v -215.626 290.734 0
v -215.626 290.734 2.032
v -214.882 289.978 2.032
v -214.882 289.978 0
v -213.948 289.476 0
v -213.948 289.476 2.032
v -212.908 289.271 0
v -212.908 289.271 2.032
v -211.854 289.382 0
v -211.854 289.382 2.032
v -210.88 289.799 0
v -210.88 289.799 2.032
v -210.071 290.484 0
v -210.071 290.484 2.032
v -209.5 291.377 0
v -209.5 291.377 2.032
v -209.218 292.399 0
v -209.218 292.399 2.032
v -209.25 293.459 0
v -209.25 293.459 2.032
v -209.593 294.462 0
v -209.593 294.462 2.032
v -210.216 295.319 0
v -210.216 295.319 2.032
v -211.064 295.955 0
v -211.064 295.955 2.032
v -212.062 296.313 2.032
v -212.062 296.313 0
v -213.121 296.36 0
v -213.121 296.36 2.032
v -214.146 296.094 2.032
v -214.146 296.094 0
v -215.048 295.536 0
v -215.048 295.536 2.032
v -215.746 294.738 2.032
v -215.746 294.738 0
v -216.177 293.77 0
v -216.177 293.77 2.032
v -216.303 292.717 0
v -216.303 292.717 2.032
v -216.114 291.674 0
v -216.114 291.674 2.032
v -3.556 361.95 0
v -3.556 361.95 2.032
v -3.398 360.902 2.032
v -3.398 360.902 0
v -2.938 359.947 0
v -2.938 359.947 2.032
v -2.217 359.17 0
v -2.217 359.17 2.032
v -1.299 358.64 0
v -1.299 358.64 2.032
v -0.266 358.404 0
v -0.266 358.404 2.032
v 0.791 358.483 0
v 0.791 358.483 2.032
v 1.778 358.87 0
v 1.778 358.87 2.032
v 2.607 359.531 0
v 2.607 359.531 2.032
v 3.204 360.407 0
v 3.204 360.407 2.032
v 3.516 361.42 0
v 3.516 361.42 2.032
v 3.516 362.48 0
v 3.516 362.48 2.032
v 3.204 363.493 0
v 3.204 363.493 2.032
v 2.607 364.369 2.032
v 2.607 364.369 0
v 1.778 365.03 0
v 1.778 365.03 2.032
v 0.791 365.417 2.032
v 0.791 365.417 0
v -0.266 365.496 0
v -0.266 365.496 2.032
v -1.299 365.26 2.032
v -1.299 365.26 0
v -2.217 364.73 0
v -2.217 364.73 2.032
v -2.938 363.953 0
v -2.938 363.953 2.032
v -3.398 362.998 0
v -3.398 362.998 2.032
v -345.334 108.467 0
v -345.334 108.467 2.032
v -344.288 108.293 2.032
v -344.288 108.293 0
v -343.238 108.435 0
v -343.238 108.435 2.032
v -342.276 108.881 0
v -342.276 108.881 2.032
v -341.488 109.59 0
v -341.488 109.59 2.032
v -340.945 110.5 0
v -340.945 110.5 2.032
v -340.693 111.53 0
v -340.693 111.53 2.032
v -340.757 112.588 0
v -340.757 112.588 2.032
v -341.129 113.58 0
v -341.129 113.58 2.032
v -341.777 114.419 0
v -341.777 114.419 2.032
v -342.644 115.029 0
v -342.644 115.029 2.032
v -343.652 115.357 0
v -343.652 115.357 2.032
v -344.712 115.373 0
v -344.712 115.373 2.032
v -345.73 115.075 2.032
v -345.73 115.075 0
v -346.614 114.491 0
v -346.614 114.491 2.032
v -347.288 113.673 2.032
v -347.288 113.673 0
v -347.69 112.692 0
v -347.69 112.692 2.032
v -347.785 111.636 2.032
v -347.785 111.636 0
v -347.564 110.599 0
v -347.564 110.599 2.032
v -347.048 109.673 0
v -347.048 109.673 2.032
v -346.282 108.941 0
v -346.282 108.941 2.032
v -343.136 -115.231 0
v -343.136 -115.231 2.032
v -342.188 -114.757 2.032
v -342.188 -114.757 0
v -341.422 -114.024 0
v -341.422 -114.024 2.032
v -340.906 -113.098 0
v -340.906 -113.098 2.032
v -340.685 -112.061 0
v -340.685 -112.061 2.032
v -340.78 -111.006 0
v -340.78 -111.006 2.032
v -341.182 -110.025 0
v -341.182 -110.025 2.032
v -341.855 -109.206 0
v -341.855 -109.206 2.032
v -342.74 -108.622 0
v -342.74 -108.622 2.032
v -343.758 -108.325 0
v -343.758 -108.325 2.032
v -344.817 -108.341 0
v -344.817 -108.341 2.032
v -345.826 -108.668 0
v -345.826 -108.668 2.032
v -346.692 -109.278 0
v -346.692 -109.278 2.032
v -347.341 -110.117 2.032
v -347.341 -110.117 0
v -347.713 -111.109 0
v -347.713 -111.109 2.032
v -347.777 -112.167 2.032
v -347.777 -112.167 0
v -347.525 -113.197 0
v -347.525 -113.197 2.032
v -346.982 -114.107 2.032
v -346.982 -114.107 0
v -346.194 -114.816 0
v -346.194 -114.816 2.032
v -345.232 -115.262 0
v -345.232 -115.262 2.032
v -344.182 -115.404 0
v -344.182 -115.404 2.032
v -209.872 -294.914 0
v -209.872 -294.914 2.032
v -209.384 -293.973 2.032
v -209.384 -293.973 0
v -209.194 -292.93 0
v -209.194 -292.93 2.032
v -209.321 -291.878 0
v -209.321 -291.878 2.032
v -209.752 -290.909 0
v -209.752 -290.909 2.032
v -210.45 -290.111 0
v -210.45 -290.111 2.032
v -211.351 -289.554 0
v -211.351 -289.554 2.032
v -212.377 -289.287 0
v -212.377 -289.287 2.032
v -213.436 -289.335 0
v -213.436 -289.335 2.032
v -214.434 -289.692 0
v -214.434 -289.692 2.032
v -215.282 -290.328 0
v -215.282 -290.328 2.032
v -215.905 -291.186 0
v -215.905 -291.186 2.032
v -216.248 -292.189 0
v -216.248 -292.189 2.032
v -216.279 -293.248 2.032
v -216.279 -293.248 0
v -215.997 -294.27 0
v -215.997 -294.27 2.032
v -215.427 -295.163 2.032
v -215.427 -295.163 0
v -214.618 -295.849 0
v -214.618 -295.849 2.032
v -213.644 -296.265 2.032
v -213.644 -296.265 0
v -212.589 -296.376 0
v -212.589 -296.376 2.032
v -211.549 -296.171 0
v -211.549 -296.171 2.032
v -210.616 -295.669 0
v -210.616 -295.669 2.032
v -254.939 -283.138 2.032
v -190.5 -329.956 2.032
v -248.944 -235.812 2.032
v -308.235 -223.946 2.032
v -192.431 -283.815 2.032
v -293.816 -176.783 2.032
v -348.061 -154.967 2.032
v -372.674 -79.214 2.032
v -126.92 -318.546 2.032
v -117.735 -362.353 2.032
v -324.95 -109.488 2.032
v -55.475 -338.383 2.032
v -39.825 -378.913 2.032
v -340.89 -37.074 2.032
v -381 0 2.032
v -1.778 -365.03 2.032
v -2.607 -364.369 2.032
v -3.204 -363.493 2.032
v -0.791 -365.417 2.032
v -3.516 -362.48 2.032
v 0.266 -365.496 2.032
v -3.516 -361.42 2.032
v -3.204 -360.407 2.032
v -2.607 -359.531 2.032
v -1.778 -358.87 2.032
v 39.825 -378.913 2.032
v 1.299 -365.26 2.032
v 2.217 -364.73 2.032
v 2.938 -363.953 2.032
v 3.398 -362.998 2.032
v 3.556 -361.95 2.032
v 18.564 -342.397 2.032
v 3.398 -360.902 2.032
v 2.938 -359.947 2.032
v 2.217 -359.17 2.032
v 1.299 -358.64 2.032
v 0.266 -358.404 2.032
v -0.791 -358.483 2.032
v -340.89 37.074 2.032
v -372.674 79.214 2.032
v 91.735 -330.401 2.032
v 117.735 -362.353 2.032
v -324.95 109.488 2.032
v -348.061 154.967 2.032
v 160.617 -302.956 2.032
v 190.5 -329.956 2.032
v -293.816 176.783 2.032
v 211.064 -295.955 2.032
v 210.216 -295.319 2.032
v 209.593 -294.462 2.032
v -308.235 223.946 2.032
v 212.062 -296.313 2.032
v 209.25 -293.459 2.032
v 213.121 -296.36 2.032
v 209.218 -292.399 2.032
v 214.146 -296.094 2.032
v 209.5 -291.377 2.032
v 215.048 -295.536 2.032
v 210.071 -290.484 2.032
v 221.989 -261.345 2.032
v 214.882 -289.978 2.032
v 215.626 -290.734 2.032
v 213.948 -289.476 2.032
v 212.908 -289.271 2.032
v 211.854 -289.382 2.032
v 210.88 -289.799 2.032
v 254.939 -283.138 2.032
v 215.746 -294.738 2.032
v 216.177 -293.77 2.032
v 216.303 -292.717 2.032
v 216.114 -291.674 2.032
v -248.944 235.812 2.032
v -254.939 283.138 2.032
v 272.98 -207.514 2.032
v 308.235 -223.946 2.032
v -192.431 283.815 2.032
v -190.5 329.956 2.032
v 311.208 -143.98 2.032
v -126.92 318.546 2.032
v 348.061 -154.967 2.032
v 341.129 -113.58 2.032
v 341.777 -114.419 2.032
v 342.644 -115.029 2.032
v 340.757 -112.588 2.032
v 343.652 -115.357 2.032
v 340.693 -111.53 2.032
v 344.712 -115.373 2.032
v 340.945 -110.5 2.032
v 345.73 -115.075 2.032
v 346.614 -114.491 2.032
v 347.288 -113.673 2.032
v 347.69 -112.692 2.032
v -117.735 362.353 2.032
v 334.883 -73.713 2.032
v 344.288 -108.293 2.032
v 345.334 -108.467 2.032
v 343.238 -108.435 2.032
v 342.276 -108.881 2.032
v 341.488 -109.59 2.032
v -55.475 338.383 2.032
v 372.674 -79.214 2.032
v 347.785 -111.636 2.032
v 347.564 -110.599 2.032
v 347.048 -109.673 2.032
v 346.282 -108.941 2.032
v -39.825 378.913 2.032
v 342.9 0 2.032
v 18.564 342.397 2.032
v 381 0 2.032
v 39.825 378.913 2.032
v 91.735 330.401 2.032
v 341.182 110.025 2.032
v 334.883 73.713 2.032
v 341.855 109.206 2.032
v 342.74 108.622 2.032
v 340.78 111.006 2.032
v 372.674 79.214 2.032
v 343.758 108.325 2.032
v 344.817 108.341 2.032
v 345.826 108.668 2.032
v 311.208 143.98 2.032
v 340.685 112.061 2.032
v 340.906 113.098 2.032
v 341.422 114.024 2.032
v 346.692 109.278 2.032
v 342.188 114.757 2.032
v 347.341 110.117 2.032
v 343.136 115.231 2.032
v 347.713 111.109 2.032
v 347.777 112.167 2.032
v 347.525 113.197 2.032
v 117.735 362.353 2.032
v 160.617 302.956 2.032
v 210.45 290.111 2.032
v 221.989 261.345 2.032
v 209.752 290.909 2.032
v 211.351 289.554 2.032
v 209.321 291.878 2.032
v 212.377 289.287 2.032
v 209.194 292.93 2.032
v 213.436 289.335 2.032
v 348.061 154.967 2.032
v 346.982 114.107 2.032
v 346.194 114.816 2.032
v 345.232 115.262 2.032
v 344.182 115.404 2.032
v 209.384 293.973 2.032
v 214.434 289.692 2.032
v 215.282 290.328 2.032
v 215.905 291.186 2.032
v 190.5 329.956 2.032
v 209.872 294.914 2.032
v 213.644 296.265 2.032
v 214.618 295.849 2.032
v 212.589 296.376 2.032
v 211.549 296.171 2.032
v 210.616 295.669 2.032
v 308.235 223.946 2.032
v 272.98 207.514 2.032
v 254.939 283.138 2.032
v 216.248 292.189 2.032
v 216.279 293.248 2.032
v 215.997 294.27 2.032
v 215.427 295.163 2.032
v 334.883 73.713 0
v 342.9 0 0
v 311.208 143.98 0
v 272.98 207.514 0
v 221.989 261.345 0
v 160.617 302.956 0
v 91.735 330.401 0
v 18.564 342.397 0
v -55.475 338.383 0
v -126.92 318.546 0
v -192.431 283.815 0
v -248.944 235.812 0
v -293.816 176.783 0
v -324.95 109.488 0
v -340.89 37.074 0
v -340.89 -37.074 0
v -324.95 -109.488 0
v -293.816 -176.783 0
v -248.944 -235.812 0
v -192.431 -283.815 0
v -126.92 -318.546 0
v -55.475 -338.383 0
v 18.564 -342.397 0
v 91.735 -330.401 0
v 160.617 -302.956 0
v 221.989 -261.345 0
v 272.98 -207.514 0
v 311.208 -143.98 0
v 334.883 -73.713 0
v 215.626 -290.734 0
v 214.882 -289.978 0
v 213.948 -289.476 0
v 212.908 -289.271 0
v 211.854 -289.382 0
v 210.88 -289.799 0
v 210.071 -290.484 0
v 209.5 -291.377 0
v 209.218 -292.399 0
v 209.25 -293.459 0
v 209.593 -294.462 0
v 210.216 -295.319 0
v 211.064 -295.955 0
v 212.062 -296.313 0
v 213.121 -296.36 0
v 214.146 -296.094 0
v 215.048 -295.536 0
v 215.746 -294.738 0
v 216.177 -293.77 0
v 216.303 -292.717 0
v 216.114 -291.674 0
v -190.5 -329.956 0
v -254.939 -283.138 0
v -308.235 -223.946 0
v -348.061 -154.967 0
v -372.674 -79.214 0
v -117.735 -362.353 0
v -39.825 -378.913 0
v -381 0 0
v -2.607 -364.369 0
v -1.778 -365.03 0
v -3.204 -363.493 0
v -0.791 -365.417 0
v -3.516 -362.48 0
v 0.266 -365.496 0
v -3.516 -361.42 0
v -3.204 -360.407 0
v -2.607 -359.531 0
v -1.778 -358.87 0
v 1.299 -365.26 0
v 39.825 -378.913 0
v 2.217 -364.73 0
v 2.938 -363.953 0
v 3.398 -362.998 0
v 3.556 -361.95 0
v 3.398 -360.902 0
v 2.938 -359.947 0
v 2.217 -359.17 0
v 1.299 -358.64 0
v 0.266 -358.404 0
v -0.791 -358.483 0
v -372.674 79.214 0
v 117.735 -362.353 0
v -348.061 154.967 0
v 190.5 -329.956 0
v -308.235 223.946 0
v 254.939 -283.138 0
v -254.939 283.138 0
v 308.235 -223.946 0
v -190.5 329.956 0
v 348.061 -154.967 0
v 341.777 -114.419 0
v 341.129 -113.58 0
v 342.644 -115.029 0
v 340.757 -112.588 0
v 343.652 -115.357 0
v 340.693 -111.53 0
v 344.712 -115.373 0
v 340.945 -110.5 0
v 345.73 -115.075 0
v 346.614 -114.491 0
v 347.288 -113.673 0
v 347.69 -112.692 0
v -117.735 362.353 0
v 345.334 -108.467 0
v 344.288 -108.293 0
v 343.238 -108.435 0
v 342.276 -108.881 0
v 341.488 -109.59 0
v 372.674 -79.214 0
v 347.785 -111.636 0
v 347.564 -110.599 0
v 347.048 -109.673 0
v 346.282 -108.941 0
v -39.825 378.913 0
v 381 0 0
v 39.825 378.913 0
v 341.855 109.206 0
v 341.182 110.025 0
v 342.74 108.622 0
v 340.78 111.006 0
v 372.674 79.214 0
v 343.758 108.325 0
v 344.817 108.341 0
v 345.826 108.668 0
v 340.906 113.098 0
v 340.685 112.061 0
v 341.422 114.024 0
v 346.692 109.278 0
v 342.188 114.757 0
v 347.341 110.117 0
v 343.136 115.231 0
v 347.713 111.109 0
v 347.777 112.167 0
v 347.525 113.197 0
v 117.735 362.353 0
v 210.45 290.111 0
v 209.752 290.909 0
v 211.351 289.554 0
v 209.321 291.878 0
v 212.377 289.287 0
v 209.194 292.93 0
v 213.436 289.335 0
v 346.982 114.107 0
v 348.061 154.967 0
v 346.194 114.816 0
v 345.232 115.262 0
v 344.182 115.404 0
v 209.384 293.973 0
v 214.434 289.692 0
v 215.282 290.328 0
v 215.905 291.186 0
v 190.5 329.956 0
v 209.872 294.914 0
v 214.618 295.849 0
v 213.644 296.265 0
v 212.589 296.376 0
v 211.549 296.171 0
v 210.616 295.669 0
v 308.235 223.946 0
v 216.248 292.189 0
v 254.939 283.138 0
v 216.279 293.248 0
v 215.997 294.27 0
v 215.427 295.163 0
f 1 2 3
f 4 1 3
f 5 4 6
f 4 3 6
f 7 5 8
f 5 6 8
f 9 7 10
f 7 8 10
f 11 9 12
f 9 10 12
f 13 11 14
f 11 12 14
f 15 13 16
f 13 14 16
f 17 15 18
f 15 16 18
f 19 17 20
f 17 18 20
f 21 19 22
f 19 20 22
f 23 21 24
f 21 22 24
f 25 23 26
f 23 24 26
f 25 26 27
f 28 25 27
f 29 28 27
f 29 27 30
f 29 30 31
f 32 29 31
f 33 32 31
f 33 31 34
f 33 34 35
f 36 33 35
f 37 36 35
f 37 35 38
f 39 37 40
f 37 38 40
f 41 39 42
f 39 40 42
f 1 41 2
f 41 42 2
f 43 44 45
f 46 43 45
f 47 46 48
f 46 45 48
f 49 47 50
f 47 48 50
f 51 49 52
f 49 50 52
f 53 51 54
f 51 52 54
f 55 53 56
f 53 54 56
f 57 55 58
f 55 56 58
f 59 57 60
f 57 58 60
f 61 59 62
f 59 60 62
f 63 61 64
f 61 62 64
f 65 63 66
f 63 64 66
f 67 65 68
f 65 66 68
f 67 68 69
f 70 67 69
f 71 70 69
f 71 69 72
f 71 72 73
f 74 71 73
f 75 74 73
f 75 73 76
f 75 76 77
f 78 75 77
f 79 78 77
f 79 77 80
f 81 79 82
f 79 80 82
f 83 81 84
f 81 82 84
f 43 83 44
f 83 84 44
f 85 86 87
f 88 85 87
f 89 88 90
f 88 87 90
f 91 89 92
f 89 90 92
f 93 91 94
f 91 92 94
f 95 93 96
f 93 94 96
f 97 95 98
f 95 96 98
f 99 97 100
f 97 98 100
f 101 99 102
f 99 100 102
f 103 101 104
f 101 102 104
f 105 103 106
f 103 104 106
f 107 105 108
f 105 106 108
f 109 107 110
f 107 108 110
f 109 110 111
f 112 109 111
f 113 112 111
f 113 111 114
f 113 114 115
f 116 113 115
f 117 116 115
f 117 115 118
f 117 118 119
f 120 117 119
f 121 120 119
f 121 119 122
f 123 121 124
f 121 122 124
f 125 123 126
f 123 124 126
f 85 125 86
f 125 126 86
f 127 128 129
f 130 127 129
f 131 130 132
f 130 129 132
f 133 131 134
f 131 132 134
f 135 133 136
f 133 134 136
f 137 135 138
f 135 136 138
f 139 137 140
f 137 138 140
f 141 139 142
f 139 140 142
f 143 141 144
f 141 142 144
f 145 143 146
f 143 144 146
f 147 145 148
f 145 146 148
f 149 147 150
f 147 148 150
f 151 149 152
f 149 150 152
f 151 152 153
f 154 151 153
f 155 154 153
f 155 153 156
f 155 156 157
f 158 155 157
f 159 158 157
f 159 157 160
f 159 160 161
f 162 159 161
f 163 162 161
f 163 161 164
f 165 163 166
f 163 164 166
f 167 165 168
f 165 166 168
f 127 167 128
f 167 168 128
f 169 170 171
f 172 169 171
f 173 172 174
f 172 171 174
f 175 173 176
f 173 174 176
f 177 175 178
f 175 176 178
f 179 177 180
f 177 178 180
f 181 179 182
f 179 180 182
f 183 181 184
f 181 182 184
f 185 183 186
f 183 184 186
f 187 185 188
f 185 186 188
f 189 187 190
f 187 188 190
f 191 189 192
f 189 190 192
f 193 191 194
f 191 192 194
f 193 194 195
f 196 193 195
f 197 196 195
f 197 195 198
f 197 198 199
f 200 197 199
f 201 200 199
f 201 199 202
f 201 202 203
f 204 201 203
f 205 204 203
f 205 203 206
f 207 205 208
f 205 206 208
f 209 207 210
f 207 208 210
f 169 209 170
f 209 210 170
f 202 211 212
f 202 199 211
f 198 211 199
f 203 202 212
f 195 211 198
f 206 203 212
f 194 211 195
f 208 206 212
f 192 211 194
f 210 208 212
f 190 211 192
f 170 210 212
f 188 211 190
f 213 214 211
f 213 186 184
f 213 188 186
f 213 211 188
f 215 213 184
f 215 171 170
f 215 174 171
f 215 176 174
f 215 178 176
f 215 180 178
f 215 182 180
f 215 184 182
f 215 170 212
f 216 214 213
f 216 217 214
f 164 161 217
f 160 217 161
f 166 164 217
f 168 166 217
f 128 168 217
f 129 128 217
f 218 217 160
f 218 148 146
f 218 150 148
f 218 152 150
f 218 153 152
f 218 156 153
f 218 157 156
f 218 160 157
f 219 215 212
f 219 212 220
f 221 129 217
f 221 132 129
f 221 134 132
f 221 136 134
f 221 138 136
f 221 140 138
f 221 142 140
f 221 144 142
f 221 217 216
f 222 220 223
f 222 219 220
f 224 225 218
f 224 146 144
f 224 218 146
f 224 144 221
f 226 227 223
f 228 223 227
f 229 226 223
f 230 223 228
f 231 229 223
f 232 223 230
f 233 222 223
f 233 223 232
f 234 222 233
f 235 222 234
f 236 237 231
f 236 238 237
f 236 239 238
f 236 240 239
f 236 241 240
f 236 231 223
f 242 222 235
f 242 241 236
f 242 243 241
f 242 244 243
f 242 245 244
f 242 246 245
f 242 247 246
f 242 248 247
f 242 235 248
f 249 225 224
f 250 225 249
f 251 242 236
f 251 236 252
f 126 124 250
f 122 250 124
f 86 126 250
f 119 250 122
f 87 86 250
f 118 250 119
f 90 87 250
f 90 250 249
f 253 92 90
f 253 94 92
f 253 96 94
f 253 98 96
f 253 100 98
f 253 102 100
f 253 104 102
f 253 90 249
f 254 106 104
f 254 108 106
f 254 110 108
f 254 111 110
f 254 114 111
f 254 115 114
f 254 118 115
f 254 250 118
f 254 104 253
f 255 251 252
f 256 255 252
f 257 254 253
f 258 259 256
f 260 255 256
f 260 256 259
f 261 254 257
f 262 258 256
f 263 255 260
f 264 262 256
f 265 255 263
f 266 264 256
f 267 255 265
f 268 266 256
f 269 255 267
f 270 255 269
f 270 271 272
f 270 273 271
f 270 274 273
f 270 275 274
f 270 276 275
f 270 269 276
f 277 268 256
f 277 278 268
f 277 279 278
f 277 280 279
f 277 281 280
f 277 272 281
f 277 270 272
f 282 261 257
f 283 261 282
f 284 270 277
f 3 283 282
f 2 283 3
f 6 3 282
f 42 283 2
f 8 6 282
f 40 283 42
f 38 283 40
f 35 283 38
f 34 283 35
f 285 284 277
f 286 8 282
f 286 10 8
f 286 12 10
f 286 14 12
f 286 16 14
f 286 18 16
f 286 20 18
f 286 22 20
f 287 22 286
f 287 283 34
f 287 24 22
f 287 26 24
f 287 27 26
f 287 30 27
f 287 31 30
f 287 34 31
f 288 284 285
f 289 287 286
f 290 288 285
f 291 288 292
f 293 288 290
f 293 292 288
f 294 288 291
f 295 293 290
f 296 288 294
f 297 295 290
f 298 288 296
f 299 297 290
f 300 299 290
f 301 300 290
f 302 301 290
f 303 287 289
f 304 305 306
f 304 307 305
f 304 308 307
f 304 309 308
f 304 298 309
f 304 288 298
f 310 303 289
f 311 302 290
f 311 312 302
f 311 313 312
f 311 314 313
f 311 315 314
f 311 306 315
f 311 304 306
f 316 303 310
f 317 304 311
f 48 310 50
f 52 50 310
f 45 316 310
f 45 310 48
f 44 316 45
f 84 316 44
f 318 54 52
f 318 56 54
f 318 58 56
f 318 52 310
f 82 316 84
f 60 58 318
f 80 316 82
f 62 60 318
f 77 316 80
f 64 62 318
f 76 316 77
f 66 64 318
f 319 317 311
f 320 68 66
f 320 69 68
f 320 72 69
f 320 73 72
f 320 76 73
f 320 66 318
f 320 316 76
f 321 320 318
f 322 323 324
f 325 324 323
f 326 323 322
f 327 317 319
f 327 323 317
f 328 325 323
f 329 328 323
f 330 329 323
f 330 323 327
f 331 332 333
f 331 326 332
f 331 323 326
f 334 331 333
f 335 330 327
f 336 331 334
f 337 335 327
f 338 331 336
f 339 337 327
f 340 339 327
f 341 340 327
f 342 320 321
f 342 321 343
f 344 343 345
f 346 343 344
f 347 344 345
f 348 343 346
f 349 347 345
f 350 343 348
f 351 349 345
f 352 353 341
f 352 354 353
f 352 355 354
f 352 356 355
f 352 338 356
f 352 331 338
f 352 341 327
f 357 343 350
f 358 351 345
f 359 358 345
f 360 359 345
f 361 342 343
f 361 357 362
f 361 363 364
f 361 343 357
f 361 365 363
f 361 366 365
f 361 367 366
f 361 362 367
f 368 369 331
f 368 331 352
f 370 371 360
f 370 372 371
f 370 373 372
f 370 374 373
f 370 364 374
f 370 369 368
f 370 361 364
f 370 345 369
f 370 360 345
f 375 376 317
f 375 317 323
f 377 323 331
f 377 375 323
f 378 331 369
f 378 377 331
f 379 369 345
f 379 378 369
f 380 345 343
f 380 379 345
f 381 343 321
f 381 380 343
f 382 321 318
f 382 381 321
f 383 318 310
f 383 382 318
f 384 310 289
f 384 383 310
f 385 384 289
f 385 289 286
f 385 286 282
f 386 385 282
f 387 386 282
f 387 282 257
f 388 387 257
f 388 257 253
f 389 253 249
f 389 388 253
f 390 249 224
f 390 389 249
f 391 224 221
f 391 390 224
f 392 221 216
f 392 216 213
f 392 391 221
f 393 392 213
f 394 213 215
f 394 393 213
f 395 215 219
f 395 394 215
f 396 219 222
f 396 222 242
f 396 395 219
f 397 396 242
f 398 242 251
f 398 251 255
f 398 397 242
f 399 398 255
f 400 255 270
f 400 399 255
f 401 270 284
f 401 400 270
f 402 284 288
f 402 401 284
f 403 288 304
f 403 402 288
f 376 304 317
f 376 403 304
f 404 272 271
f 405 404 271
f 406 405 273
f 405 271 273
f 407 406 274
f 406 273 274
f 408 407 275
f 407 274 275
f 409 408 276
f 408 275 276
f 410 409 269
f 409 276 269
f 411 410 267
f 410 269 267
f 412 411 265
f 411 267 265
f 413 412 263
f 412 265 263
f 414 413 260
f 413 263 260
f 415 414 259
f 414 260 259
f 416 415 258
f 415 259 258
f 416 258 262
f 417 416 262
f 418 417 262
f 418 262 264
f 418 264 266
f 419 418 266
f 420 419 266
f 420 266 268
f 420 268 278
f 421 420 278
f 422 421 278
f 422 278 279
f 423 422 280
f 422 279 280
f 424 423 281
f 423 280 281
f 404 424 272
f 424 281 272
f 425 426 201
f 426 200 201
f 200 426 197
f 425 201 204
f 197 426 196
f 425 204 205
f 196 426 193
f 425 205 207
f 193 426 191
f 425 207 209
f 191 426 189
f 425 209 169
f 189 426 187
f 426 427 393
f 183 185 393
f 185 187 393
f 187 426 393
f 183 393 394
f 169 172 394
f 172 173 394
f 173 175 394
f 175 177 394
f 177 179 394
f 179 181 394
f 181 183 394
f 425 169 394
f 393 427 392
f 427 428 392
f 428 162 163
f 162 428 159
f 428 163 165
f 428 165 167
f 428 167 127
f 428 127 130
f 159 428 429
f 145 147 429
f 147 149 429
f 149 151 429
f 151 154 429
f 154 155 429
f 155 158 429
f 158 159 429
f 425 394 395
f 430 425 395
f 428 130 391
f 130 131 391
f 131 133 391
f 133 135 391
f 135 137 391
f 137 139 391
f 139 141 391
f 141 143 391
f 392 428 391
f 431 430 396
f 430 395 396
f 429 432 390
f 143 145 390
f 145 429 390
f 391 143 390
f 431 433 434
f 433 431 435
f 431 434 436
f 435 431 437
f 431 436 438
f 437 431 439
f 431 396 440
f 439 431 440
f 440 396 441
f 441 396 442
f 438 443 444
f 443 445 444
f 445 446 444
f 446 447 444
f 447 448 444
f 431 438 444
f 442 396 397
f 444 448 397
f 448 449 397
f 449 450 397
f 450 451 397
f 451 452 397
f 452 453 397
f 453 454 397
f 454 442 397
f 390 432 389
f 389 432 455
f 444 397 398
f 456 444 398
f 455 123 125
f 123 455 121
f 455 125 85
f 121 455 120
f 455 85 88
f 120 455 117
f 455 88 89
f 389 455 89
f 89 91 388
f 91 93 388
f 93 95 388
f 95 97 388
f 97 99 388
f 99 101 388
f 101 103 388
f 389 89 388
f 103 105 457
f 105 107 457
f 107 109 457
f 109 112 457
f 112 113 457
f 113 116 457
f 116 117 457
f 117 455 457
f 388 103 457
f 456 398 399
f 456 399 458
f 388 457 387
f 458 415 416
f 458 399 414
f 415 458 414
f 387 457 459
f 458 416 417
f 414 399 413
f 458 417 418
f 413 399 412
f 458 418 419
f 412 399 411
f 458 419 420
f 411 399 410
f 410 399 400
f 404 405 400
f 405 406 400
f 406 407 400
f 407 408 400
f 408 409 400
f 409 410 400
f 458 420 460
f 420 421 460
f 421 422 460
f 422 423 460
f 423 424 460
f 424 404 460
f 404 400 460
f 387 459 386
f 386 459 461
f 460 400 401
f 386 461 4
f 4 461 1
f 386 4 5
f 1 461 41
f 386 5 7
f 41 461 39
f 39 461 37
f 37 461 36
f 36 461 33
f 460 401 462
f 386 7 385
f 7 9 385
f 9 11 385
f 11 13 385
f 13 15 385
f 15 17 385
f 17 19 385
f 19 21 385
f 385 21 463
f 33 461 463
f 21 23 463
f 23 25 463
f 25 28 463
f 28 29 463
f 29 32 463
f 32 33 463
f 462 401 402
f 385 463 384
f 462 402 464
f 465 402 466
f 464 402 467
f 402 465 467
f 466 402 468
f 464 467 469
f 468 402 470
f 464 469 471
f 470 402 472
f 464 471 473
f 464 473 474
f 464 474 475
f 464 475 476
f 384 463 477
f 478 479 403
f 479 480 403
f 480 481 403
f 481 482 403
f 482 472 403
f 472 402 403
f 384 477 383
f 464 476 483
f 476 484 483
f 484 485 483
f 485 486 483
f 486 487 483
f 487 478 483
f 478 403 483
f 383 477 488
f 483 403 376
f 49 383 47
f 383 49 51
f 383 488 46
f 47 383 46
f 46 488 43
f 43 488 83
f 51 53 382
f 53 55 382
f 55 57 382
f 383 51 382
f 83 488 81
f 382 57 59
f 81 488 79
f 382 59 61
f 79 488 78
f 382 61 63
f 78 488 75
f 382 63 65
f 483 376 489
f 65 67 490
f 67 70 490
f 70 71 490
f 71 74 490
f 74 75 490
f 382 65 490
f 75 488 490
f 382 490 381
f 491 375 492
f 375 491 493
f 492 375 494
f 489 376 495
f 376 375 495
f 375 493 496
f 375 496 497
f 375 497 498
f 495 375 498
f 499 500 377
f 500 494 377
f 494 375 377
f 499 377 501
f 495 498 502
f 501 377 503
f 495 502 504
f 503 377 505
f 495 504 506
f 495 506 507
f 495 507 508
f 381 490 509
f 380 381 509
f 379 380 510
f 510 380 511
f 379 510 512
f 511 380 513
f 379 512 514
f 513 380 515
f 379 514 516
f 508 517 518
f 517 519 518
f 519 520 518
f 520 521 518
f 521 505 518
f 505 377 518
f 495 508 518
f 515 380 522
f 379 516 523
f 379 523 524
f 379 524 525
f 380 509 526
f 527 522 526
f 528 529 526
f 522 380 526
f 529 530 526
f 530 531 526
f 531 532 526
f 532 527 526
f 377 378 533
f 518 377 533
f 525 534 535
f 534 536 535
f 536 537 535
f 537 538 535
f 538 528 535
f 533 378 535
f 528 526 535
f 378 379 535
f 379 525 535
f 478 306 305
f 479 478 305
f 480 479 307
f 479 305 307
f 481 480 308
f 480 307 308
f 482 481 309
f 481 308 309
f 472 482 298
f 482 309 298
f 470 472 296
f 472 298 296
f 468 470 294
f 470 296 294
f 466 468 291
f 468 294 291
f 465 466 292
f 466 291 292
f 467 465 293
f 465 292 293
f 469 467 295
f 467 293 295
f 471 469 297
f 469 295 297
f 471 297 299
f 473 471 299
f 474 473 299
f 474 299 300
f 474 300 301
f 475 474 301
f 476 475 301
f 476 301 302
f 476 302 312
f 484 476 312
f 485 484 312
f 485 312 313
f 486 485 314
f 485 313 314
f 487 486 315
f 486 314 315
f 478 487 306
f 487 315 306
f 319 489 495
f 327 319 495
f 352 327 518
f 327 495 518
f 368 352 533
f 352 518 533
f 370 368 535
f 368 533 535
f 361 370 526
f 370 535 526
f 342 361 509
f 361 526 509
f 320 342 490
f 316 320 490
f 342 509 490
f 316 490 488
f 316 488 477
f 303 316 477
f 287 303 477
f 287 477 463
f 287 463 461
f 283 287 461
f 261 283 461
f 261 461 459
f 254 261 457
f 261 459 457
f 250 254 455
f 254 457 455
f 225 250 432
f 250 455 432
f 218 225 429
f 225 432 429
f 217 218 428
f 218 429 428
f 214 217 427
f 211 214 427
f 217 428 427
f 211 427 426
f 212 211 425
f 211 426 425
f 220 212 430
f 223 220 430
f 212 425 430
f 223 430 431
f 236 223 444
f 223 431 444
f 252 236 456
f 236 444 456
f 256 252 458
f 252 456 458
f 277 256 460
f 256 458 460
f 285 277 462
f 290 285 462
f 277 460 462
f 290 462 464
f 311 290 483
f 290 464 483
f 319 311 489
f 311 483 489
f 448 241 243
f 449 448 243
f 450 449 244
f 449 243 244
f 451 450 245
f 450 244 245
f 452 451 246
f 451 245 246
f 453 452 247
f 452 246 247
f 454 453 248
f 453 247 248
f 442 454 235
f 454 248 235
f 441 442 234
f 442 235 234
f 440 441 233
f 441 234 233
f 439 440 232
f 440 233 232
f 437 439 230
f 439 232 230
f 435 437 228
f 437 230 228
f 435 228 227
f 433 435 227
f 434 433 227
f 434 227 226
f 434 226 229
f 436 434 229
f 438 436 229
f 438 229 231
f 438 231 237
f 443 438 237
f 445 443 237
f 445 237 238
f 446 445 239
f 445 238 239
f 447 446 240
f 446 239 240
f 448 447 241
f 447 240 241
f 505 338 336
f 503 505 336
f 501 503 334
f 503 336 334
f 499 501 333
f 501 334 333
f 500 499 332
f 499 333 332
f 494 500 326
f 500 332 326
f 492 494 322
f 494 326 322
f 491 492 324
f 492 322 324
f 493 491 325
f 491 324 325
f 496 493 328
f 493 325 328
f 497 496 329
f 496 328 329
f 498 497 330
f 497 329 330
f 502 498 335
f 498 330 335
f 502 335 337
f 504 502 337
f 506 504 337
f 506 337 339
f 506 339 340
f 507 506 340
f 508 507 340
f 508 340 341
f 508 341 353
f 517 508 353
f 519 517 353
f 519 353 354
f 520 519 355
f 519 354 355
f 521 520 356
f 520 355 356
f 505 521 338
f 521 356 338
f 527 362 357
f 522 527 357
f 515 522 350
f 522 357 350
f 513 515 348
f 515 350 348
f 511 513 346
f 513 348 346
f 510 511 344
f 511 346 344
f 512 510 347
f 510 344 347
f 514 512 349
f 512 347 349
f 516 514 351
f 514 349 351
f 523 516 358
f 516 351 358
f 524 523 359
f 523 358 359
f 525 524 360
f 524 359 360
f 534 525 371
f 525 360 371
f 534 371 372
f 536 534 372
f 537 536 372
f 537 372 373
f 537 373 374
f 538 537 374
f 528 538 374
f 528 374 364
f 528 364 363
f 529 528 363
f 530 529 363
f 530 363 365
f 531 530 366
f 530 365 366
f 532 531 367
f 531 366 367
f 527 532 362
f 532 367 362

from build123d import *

# Parameters (mm, degrees)
SKETCH1_R          = 381
SKETCH1_R_2        = 342.9
EXTRUDE1_DEPTH     = 2.032
SKETCH2_R          = 3.556
CUT_EXTRUDE1_DEPTH = 2.032
CIRPATTERN1_COUNT  = 10


with BuildPart() as part:
    # Sketch1 → Extrude1 (new body)
    with BuildSketch(Plane.XY):
        Circle(SKETCH1_R)
        Circle(SKETCH1_R_2, mode=Mode.SUBTRACT)
    extrude(amount=EXTRUDE1_DEPTH)

    # Sketch2 → Cut-Extrude1 (cut)
    with BuildSketch(Plane.XY.offset(2.032)):
        with Locations((0, -361.95)):
            Circle(SKETCH2_R)
    cut_extrude1 = extrude(amount=-CUT_EXTRUDE1_DEPTH, mode=Mode.SUBTRACT)

    # CirPattern1: Cut-Extrude1 ×10 about axis
    cirpattern1_axis = Axis((0, 0, 0), (0, 0, 1))
    for i in range(1, CIRPATTERN1_COUNT):
        add(cut_extrude1.rotate(cirpattern1_axis, i * 360 / CIRPATTERN1_COUNT), mode=Mode.SUBTRACT)


solid = part.part
